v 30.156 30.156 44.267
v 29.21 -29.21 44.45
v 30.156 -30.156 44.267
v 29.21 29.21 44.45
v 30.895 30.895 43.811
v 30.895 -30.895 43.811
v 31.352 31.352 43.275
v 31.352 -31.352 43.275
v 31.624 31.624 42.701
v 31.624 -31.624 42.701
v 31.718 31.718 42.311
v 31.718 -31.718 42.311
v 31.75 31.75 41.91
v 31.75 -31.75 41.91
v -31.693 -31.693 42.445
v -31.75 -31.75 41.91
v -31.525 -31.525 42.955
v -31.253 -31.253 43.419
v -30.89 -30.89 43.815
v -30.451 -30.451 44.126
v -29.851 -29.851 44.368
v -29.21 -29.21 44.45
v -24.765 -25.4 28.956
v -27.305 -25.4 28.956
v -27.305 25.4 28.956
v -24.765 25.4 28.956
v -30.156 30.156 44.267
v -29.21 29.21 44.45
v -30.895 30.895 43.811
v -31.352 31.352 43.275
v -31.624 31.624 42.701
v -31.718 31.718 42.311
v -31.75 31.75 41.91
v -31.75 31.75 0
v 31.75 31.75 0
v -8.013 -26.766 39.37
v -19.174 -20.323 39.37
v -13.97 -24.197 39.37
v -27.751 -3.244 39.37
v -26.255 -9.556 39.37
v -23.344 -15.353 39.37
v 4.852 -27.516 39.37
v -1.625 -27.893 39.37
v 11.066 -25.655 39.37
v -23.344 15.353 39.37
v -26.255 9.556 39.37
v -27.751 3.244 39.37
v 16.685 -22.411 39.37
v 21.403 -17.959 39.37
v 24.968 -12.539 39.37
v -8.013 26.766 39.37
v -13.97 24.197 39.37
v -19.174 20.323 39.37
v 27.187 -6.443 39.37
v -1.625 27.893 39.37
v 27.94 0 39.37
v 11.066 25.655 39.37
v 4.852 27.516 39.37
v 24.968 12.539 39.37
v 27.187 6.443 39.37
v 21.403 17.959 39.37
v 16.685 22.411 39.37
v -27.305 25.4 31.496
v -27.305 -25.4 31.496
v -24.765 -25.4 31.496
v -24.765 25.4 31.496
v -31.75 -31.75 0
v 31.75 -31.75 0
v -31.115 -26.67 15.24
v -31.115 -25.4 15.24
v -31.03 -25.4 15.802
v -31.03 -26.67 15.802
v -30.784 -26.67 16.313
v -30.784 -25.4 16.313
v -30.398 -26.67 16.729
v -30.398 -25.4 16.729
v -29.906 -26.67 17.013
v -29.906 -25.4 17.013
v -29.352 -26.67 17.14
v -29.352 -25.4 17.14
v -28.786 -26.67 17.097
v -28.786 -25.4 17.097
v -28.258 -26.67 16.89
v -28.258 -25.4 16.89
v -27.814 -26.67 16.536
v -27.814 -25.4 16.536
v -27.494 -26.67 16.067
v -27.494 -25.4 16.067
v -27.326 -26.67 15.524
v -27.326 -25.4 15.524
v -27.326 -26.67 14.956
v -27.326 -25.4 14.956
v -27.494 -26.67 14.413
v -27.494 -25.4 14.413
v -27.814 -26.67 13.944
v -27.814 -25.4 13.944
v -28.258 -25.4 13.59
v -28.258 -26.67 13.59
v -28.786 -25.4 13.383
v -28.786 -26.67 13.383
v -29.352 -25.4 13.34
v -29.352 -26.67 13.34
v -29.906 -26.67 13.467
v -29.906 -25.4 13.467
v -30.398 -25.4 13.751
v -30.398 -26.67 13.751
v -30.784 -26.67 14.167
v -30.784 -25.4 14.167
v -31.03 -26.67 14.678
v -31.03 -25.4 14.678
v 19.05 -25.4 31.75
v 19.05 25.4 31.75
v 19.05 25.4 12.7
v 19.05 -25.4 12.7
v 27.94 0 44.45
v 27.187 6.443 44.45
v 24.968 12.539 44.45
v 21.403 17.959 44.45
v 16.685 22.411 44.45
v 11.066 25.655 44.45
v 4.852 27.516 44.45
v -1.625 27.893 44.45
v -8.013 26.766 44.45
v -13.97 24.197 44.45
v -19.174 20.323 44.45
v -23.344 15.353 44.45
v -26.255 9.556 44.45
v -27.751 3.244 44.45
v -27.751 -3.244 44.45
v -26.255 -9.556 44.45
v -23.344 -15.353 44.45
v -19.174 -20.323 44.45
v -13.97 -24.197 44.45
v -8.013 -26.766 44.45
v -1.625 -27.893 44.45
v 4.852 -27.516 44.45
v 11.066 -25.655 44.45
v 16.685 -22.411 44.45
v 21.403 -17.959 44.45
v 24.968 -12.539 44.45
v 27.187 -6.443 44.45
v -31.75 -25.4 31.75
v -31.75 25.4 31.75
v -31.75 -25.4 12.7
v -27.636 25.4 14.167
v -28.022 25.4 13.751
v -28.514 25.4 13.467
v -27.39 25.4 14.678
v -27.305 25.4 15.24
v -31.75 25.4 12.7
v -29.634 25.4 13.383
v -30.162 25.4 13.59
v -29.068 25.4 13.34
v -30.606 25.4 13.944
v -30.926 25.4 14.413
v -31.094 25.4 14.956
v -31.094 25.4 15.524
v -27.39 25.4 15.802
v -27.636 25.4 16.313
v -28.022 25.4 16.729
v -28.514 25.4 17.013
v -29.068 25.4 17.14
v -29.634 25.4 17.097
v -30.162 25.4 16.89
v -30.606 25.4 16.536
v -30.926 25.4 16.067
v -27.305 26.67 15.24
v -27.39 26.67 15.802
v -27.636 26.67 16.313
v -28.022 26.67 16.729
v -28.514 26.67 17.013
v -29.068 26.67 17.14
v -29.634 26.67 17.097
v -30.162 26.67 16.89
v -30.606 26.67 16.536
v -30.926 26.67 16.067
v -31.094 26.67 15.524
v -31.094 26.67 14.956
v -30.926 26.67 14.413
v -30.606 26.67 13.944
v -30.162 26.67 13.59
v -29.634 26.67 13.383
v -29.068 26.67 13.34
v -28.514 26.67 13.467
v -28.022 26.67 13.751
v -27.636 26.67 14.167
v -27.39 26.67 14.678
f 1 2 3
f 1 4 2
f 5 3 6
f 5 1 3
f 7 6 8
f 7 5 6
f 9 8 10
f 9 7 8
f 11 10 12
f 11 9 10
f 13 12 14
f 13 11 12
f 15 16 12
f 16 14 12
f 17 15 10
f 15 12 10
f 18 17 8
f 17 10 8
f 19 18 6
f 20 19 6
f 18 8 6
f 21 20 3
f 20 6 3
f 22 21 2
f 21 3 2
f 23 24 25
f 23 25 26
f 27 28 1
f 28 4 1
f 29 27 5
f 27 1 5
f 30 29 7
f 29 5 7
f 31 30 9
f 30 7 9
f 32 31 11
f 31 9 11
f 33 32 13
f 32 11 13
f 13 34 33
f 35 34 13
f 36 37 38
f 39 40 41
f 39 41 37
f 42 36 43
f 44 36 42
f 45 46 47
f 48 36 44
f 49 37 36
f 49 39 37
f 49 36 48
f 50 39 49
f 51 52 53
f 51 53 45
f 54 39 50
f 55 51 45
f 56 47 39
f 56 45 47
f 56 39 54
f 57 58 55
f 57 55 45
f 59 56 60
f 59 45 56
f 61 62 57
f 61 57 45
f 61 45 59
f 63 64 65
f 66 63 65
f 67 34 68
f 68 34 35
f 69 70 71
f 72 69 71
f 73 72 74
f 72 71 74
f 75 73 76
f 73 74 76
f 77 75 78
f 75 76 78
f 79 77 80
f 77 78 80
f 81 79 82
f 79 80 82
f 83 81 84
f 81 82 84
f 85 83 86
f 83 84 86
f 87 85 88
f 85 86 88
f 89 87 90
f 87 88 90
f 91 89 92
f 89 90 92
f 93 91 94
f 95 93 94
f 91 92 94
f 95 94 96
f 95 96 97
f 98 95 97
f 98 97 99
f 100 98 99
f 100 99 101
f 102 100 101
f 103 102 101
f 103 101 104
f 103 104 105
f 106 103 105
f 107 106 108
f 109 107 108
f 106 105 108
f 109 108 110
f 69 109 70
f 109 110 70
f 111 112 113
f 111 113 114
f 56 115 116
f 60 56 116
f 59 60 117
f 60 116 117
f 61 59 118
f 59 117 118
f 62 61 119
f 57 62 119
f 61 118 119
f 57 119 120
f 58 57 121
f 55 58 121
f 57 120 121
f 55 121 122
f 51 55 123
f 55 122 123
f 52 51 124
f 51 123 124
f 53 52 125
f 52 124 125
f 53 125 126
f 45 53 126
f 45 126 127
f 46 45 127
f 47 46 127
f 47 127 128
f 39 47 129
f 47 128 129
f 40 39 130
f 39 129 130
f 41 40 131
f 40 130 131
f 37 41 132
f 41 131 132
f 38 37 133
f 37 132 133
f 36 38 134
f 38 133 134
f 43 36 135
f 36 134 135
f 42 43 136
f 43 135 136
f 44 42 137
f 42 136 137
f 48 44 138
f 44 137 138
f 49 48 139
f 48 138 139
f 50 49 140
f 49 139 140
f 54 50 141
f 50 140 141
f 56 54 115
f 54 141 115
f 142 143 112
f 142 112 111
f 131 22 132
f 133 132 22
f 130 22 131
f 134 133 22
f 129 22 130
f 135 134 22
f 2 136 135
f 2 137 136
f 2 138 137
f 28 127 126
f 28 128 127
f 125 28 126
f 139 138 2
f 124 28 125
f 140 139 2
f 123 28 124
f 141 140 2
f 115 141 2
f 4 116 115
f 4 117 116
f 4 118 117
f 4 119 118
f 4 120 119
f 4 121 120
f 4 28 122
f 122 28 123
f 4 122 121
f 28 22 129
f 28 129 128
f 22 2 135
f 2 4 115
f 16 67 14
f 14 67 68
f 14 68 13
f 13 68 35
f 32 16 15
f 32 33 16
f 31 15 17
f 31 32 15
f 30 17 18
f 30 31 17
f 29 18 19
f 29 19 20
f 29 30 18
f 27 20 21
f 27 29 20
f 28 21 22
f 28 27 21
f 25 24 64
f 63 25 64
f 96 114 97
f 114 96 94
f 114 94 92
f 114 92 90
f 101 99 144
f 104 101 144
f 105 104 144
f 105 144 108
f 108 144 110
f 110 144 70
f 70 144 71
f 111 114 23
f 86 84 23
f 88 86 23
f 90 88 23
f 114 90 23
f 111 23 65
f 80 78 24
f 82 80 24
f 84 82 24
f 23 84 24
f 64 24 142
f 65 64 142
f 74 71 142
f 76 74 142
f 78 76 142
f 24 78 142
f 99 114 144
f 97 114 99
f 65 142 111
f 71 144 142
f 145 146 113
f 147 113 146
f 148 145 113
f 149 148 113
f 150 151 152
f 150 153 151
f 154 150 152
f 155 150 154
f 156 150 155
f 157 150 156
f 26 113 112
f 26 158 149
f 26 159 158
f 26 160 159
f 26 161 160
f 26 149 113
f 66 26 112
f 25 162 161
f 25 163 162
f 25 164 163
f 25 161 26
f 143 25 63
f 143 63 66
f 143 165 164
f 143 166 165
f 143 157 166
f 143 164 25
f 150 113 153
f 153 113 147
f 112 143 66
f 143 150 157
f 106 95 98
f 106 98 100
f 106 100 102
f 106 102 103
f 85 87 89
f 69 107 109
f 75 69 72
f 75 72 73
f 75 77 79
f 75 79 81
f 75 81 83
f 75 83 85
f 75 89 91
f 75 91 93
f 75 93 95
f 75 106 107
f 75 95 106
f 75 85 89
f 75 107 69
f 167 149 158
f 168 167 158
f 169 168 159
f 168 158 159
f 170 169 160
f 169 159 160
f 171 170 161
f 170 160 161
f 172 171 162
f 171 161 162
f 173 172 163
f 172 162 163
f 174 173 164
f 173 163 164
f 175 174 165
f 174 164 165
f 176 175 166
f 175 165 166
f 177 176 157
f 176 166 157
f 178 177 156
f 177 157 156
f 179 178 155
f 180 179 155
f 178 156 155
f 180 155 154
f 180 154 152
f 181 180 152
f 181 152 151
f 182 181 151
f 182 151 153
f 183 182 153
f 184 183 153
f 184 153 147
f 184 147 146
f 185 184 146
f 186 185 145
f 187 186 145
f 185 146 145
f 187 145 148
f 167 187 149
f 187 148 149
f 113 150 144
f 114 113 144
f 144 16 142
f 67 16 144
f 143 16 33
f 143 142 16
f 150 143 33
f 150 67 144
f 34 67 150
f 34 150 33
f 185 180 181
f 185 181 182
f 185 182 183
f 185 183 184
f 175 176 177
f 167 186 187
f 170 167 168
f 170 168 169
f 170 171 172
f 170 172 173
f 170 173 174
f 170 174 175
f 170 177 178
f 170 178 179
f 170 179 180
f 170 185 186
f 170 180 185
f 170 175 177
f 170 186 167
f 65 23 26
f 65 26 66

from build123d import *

# Parameters (mm, degrees)
F0_W      = 63.5
F0_H      = 63.5
F1_DEPTH  = 44.45
F2_R      = 27.94
F3_DEPTH  = 5.08
F4_W      = 50.8
F4_H      = 19.05
F5_DEPTH  = 50.8
F7_R      = 1.905
F6_R      = 1.905
F8_DEPTH  = 1.27
F9_R      = 2.54
F10_W     = 2.54
F10_H     = 2.54
F11_DEPTH = 50.8


with BuildPart() as f1:
    # F0 (on Top) → F1 (new body)
    with BuildSketch(Plane.XY):
        Rectangle(F0_W, F0_H)
    extrude(amount=F1_DEPTH)

    # F2 (on face) → F3 (cut)
    with BuildSketch(Plane.XY.offset(44.45)):
        Circle(F2_R)
    extrude(amount=-F3_DEPTH, mode=Mode.SUBTRACT)

    # F4 (on face) → F5 (cut)
    with BuildSketch(Plane(origin=(-31.75, 0, 0), x_dir=(0, -1, 0), z_dir=(-1, 0, 0))):
        with Locations((0, 22.225)):
            Rectangle(F4_W, F4_H)
    extrude(amount=-F5_DEPTH, mode=Mode.SUBTRACT)

    # F7 (on face) + F6 (on face) → F8 (cut, symmetric)
    with BuildSketch(Plane(origin=(0, -25.4, 0), x_dir=(-1, 0, 0), z_dir=(0, 1, 0))):
        with Locations((29.21, 15.24)):
            Circle(F7_R)
    with BuildSketch(Plane.XZ.offset(-25.4)):
        with Locations((-29.21, 15.24)):
            Circle(F6_R)
    extrude(amount=F8_DEPTH, both=True, mode=Mode.SUBTRACT)

    # F9
    f9_edges = [f1.edges().sort_by_distance(p)[0] for p in [
        (0, 31.75, 44.45),
        (-31.75, 0, 44.45),
        (31.75, 0, 44.45),
        (0, -31.75, 44.45),
    ]]
    fillet(f9_edges, radius=F9_R)

    # F10 (on face) → F11 (join)
    with BuildSketch(Plane.XZ.offset(-25.4)):
        with Locations((-26.035, 30.226)):
            Rectangle(F10_W, F10_H)
    extrude(amount=F11_DEPTH)


solid = f1.part
